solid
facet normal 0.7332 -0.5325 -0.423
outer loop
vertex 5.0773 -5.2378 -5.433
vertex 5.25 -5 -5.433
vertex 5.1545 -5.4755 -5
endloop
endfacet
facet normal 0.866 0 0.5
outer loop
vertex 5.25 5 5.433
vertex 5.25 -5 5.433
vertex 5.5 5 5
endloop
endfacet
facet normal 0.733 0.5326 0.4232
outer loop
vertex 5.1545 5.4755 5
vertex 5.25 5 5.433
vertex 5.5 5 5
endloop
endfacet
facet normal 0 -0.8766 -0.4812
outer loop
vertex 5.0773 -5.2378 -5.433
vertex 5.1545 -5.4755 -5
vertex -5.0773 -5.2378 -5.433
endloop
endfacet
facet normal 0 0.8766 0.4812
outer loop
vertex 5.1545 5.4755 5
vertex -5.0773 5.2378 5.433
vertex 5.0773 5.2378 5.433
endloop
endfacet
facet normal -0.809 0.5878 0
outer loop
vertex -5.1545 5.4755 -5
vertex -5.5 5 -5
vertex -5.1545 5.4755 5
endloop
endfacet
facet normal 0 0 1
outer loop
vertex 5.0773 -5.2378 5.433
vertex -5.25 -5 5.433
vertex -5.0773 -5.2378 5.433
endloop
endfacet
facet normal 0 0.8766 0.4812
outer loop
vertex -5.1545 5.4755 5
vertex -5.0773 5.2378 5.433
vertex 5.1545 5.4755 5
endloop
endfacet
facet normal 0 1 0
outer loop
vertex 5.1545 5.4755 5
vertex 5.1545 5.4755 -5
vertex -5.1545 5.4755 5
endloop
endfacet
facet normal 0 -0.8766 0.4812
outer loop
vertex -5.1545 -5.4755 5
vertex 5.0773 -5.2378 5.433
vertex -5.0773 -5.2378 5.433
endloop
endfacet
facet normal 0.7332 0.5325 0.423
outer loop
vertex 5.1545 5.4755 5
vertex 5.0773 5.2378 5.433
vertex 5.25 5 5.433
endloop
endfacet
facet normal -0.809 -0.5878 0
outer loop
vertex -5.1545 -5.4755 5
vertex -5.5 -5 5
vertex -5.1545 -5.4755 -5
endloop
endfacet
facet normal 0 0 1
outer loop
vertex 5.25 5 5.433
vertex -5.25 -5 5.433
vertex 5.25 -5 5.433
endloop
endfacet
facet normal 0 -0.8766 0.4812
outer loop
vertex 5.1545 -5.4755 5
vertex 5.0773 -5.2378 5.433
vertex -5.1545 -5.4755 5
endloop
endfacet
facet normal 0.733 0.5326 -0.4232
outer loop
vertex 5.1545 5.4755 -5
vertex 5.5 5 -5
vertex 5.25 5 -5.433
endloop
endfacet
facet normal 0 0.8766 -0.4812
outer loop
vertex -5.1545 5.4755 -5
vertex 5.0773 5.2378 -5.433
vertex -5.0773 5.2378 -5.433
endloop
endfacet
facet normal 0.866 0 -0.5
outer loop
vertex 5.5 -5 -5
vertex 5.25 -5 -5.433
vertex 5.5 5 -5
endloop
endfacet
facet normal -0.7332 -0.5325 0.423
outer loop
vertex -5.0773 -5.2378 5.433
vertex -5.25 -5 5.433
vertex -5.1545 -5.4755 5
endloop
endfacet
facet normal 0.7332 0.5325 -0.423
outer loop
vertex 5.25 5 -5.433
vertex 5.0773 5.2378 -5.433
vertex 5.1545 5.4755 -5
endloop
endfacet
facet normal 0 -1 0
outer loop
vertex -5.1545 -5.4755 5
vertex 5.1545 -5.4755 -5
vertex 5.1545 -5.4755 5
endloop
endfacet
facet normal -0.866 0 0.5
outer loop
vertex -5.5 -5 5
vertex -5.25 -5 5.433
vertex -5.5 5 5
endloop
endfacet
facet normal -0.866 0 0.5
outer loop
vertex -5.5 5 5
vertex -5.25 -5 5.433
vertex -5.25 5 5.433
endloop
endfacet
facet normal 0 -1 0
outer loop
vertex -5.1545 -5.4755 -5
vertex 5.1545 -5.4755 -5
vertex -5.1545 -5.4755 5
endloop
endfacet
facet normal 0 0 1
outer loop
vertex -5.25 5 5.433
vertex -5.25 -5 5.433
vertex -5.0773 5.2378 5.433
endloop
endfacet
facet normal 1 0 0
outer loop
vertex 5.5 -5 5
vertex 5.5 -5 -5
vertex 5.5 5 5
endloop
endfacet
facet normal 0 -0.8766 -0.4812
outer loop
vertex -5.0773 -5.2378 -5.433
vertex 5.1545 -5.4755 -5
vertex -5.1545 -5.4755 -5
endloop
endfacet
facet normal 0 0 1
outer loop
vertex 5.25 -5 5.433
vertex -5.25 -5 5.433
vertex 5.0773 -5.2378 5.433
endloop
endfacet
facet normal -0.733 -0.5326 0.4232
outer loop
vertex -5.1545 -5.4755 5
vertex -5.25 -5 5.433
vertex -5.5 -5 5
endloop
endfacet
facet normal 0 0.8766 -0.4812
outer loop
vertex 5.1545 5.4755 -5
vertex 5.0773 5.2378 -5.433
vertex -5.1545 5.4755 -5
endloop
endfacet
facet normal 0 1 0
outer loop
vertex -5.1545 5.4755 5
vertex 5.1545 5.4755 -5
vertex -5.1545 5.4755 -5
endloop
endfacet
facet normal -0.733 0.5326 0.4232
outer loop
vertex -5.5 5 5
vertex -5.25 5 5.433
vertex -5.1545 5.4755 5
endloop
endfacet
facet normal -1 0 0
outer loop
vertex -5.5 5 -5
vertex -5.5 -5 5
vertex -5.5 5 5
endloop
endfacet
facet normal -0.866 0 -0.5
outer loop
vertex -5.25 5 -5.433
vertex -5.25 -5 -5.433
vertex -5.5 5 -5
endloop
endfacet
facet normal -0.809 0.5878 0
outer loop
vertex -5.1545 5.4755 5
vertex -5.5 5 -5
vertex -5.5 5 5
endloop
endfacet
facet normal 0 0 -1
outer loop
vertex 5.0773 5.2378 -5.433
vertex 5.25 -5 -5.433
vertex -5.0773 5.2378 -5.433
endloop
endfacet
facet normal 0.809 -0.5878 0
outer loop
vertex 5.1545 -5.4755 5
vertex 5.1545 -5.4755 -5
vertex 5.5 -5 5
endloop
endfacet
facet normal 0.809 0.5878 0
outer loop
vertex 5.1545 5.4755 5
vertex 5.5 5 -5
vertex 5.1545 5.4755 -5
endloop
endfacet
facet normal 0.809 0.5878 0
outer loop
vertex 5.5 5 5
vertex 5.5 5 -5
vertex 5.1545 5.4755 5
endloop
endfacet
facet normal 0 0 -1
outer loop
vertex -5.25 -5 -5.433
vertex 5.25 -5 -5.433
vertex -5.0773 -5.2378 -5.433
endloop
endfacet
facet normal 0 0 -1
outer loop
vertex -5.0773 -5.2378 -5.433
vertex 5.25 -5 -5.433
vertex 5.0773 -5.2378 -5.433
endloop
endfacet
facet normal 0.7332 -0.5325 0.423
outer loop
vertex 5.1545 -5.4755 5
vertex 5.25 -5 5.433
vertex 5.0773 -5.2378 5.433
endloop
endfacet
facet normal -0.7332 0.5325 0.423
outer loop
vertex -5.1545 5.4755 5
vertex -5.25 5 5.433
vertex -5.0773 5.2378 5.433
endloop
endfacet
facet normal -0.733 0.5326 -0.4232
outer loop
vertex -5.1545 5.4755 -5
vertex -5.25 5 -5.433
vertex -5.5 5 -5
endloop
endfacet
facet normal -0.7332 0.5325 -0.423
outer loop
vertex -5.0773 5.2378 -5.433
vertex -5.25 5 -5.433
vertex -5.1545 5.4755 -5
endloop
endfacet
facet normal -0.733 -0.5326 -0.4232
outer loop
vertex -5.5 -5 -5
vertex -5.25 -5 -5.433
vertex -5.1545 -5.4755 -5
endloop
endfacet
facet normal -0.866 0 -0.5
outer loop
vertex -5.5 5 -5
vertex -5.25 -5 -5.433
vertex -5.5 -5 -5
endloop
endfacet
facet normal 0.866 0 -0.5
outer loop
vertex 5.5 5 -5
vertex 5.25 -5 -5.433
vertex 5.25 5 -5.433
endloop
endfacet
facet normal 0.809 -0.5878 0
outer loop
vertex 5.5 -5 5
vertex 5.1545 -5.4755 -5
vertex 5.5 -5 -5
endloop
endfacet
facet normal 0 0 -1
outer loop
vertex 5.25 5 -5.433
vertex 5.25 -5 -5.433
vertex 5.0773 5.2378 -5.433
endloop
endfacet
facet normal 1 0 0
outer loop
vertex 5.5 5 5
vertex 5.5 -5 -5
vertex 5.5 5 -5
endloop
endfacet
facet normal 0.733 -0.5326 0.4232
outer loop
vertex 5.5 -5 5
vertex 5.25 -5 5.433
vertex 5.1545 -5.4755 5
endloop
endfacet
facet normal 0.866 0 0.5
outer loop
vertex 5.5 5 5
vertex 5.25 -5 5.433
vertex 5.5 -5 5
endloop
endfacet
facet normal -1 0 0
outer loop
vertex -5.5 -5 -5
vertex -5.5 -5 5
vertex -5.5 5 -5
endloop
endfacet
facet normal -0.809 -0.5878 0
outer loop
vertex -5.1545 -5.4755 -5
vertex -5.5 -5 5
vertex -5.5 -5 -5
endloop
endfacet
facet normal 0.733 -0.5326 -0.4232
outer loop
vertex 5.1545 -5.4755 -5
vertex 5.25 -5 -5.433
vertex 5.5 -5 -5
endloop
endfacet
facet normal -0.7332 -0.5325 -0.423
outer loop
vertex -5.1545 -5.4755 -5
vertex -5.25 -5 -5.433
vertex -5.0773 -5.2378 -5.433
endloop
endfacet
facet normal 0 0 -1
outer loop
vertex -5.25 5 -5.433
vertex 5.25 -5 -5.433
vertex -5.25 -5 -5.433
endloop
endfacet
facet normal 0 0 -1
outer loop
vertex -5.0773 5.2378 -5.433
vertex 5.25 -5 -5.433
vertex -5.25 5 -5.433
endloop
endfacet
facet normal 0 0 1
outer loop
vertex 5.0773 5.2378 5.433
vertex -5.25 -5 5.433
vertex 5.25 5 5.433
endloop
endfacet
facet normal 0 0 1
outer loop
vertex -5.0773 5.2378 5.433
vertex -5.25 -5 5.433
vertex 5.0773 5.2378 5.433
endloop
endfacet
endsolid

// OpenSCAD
// -*- mode: SCAD ; c-file-style: "ellemtel" ; coding: utf-8 -*-
//
// NN
//
// © 2018–2019 Roland Sieker <ospalh@gmail.com>
// Licence: CC-BY-SA 4.0

/* [Global] */

// … to preview. You will get all parts as separate STLs when you click “Create Thing”.
part = "a"; // [s: Set, a: Part A, b: Part B]

// Set this to “render” and click on “Create Thing” when done with the setup.
preview = 1; // [0:render, 1:preview]

/* [Sizes] */

// Gap for the line
gap = 3;  // [1:0.1:10]
// Thickness of the button
th_b = 5;  // [3:1:10]
// Radius of the button
r_b = 8;   // [3:1:20]

// Tiefe, d.h. width of the bit
t = 20;  // [5:1:50]
// Länge, length of the arms
l = 20;  // [5:1:50]
// Höhe, Thickness of the window sill
h = 20;  // [5:1:50]

/* [Hidden] */

// Done with the customizer

// *******************************************************
// Extra parameters. These can be changed reasonably safely.


w = 1.8;  // Wall width
p = 1.2;  // Bottom, top plate hight
c = 0.4;  // Clearance
angle = 60; // Overhangs much below 60° are a problem for me
r_r = 0.5;  // Rounding radius

// *******************************************************
// Some shortcuts. These shouldn’t be changed


module kmirror(maxis=[1, 0, 0])
{
   // Keep *and* mirror an object. Standard is left and right mirroring.
   children();
   mirror(maxis)
   {
      children();
   }
}

tau = 2 * PI;  // π is still wrong. τ = circumference / r

xy_factor = 1/tan(angle);
// To get from a hight to a horizontal width inclined correctly
z_factor = tan(angle);  // The other way around


some_distance = 50;
ms = 0.01;  // Muggeseggele.

// fn for differently sized objects and fs, fa; all for preview or rendering.
pna = 40;
pnb = 15;
pa = 5;
ps = 1;
rna = 180;
rnb = 30;
ra = 2;
rs = 0.25;
function na() = (preview) ? pna : rna;
function nb() = (preview) ? pnb : rnb;
$fs = (preview) ? ps : rs;
$fa = (preview) ? pa : ra;

// *******************************************************
// End setup



// *******************************************************
// Generate the parts

print_part();


if ("s" == part)
{
   preview_parts();
}

if ("st" == part)
{
   // Use "st" during development
   stack_parts();
}

module print_part()
{
   if ("a" == part)
   {
      hakending();
   }
   if ("b" == part)
   {
      part_b();
   }
}

module preview_parts()
{
   hakending();
   translate([some_distance, 0, 0])
   {
      part_b();
   }
}

module stack_parts()
{
   // intersection()
   {
      color("yellow")
      {
         hakending();
      }
      translate([0,0,30])
      {
         color("red")
         {
            part_b();
         }
      }
   }
}

// *******************************************************
// Code for the parts themselves

module hakending()
{
   hakendinghull();
}


module hakendinghull()
{
   hull()
      kmirror([0,0,1]) translate([0, 0, 5])
      kmirror([0,1,0]) translate([0, 5, 0])
      kmirror([1,0,0]) translate([5, 0, 0])
   {
         sphere(r=r_r);
   }
}
